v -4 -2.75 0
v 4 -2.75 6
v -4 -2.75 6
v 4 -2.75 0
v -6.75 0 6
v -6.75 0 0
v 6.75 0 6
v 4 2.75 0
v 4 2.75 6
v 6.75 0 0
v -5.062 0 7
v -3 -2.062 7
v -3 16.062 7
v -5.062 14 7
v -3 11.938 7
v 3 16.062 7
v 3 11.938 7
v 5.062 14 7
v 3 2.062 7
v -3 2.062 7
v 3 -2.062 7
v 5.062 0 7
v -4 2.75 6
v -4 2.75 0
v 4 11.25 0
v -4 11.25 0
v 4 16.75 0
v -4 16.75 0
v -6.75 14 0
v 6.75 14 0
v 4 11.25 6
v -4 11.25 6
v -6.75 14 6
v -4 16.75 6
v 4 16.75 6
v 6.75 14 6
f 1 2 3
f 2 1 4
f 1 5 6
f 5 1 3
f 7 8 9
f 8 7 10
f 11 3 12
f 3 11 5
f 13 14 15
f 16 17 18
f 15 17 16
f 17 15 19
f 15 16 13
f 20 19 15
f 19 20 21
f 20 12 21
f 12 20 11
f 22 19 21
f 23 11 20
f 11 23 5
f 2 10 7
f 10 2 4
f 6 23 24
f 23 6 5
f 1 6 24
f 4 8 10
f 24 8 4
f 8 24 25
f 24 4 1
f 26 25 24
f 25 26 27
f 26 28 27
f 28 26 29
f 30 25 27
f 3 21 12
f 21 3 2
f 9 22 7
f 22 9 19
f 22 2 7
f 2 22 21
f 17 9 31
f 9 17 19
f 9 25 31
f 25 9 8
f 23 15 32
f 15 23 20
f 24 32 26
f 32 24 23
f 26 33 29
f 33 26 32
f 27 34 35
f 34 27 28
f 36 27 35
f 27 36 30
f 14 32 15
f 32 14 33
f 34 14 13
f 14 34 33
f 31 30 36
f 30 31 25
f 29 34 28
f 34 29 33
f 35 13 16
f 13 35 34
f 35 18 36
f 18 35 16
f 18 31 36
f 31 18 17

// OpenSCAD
bumpScale=0.75;
bumpHeight=1;
brickHeight=6;
mw=8;
ew=5.5;
lengthHack=0.5;

bew=sqrt((ew*ew)/2);


brick();


module brick() {
  brickEndBumped();
  translate([0,mw/2+ew/2,0]) brickMiddleBumped();
  translate([0,ew+mw+lengthHack,0]) brickEndBumped();
}

module brickMiddleBumped() {
  hull() {
    brickMiddle(brickHeight);
    scale([bumpScale,1+1-bumpScale,1]) translate([0,0,brickHeight]) brickMiddle(bumpHeight);
  }
}

module brickEndBumped() {
  hull() {
    brickEnd(brickHeight);
    scale([bumpScale,bumpScale,1]) translate([0,0,brickHeight]) brickEnd(bumpHeight);
  }
}



module brickMiddle(h) {
  translate([-mw/2,-mw/2,0]) cube([mw,mw+lengthHack,h]);
}

module brickEnd(h) {
  translate([-mw/2,-ew/2,0]) cube([mw,ew,h]);
  translate([mw/2,-ew/2,0]) rotate([0,0,45]) cube([bew,bew,h]);
  translate([-mw/2,-ew/2,0]) rotate([0,0,45]) cube([bew,bew,h]);
}
